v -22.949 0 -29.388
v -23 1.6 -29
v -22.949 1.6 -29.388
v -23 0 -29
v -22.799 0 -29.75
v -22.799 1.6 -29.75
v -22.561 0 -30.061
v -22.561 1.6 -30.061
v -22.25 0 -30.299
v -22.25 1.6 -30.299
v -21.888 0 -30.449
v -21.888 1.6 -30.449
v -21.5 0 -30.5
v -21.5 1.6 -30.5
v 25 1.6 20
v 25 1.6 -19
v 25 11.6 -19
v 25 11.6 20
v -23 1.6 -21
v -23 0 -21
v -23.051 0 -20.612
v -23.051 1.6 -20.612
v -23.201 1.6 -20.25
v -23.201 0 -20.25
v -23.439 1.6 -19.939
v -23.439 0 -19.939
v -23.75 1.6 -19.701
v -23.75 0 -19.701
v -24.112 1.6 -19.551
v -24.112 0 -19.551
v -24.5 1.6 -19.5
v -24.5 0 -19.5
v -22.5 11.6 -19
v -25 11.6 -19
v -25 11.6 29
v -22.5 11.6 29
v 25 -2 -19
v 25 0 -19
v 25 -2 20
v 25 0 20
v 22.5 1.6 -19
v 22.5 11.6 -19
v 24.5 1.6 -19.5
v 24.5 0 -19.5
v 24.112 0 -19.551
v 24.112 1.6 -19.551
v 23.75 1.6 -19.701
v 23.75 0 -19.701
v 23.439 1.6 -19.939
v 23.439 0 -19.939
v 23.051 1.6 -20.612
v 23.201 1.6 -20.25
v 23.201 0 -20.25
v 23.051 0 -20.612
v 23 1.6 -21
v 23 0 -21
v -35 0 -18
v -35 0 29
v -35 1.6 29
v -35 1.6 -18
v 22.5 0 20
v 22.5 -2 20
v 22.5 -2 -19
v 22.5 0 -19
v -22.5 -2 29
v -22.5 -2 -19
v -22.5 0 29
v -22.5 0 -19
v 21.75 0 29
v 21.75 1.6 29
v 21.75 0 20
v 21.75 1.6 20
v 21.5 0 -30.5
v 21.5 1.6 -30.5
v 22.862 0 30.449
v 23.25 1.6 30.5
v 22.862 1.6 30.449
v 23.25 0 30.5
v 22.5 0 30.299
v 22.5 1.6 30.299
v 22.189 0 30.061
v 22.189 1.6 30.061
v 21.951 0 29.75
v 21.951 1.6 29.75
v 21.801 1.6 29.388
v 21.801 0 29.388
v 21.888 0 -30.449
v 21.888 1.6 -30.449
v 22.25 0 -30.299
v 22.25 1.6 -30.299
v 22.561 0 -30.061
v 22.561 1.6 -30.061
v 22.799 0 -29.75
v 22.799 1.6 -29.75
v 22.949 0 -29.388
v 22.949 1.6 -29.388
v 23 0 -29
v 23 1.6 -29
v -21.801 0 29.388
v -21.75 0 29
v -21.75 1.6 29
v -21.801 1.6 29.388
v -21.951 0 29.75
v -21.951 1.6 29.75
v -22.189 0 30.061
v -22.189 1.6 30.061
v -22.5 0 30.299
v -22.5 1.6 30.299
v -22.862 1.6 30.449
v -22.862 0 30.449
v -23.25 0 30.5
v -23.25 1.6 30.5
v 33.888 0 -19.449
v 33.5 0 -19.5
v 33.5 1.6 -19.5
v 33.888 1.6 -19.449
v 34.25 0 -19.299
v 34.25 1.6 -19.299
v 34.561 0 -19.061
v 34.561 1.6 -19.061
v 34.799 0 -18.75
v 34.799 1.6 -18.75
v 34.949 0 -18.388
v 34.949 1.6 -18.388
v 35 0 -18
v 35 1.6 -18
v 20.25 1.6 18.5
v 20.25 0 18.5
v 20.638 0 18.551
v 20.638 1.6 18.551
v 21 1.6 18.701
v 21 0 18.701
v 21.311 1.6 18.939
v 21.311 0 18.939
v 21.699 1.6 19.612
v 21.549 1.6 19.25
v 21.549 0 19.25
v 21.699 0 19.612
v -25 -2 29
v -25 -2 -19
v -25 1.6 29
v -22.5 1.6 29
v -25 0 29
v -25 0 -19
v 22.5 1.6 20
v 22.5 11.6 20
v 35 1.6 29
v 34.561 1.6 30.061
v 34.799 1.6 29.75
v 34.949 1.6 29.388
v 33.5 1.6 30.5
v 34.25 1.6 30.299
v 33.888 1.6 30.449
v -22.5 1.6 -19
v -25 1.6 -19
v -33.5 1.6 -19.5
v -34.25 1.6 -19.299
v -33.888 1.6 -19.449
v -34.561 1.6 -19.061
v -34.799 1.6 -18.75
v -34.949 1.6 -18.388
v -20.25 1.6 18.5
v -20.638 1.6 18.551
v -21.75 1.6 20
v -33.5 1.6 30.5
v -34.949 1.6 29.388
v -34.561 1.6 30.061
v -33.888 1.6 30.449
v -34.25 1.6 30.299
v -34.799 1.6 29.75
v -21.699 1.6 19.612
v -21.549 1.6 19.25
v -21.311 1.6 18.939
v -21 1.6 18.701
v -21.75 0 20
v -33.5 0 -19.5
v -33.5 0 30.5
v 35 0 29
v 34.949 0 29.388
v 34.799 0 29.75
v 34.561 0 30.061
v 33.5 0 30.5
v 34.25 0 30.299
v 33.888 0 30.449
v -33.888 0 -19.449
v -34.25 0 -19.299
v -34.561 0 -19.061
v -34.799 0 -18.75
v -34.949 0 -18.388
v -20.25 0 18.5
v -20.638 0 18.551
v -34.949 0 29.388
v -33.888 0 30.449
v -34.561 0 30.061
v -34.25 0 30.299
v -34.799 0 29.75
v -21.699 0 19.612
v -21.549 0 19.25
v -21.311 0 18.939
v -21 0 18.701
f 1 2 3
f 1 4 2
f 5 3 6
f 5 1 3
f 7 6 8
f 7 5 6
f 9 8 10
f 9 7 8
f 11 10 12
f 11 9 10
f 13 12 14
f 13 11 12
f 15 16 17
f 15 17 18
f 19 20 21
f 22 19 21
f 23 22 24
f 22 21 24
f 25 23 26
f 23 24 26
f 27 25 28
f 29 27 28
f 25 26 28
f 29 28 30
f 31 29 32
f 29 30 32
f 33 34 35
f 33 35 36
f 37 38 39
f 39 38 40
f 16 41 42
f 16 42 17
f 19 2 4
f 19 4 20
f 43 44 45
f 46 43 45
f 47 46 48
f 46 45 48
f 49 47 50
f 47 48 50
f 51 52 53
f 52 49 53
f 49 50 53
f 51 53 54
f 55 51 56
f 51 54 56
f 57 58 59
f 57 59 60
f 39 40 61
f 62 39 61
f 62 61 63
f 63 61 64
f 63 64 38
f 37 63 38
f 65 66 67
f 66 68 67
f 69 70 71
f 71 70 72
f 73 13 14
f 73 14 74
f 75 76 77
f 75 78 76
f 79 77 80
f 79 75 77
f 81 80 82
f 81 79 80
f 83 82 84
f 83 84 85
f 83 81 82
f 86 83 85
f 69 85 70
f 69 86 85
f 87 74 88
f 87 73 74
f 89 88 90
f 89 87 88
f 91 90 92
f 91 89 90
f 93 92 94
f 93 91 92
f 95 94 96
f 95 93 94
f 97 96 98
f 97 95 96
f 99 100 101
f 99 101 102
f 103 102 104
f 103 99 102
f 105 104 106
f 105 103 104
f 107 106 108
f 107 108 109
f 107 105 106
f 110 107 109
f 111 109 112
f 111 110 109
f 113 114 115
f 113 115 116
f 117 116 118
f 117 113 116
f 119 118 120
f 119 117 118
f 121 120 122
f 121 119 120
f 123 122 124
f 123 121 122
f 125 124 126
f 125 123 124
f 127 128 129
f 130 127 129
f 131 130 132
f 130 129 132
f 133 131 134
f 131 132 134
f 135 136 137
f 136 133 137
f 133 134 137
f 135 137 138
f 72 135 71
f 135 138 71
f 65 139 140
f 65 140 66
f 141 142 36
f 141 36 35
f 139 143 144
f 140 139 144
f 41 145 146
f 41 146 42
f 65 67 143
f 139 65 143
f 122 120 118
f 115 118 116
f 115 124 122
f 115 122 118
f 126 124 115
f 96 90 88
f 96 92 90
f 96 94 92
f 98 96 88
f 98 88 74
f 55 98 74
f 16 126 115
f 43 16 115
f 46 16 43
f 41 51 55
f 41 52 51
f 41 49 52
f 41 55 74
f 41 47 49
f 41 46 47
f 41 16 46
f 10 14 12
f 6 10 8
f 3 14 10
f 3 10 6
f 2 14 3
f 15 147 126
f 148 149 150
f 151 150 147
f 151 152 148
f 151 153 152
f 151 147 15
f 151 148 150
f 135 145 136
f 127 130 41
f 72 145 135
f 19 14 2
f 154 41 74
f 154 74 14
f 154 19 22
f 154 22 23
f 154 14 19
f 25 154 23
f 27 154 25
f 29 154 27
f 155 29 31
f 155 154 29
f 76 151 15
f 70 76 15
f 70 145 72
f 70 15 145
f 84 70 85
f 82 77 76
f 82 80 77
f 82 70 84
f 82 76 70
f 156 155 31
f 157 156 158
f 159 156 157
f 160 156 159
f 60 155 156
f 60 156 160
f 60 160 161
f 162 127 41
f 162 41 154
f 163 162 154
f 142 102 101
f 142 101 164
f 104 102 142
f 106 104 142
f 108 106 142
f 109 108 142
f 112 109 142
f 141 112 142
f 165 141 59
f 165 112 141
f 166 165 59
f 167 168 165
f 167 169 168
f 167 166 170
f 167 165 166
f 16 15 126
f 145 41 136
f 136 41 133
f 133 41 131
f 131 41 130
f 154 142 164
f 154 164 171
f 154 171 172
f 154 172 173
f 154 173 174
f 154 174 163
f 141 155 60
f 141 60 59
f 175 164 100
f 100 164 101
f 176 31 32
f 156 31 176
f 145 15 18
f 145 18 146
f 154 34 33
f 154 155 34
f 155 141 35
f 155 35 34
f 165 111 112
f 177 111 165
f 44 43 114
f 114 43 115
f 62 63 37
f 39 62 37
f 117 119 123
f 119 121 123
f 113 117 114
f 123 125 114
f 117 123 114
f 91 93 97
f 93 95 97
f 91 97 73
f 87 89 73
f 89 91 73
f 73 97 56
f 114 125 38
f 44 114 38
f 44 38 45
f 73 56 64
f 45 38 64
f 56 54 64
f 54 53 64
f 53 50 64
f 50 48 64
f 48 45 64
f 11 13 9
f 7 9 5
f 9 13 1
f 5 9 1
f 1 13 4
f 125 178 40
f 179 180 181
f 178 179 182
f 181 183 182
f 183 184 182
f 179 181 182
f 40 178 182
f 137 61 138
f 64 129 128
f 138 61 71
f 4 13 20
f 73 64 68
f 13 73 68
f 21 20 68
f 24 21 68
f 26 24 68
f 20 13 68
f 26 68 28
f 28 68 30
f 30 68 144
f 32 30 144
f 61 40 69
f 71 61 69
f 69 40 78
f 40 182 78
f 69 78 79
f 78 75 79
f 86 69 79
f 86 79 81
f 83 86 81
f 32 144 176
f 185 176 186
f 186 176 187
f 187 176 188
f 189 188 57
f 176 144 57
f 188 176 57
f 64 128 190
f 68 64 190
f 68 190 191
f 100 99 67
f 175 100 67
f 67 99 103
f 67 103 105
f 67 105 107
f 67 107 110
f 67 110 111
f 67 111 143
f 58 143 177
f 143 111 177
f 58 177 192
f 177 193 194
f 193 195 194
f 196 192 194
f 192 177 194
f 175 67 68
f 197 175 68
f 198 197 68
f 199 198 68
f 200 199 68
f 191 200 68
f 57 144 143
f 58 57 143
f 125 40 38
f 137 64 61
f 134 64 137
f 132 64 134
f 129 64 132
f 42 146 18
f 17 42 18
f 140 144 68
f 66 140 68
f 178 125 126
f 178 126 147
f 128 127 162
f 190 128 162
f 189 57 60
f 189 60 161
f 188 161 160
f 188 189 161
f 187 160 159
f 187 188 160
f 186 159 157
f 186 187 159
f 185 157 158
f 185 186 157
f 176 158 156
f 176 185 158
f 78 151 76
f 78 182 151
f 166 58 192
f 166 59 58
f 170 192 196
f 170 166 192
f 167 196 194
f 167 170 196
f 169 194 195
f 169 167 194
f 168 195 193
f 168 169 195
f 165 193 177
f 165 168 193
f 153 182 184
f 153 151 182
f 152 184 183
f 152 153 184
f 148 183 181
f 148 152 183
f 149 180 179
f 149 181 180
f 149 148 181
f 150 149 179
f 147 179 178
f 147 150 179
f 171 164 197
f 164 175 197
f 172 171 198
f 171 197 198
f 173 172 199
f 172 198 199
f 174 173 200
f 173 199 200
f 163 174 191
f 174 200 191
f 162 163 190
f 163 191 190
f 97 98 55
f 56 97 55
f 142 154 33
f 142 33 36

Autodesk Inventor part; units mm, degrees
ref_plane "YZ Plane" through (0, 0, 0) normal (1, 0, 0) x (0, 1, 0)
ref_plane "XZ Plane" through (0, 0, 0) normal (0, 1, 0) x (-1, 0, 0)
ref_plane "XY Plane" through (0, 0, 0) normal (0, 0, 1) x (1, 0, 0)
sketch "Esquisse1" plane through (0, 0, 0) normal (0, 1, 0) x (-1, 0, 0)
  line L0 (35, -30.5) -> (-35, -30.5)
  line L1 (-35, -30.5) -> (-35, 30.5)
  line L2 (-35, 30.5) -> (35, 30.5)
  line L3 (35, 30.5) -> (35, -30.5)
  point P0 (0, 0)
  dimension "d0" = 70
  dimension "d1" = 35
  dimension "d2" = 61
  dimension "d3" = 30.5
extrude "Extrusion1" add sketch "Esquisse1" along normal blind 1.6
sketch "Esquisse2" plane through (0, 1.6, 0) normal (0, 1, 0) x (1, 0, 0)
  line L0 (35, 30.5) -> (-35, 30.5) projected
  line L1 (-35, 30.5) -> (-23, 30.5)
  line L2 (-23, 30.5) -> (-23, 19.5)
  line L3 (-23, 19.5) -> (-35, 19.5)
  line L4 (-35, 19.5) -> (-35, 30.5)
  line L5 (35, 30.5) -> (23, 30.5)
  line L6 (23, 30.5) -> (23, 19.5)
  line L7 (23, 19.5) -> (35, 19.5)
  line L8 (35, 19.5) -> (35, 30.5)
  line L9 (-35, -30.5) -> (35, -30.5) projected
  line L10 (-20.5, -30.5) -> (23, -30.5)
  line L11 (-21.75, -30.5) -> (21.75, -30.5)
  line L12 (21.75, -30.5) -> (21.75, -18.5)
  line L13 (21.75, -18.5) -> (-21.75, -18.5)
  line L14 (-21.75, -18.5) -> (-21.75, -30.5)
  point P0 (0, 0)
  dimension "d6" = 12
  dimension "d7" = 12
  dimension "d8" = 11
  dimension "d11" = 43.5
  dimension "d12" = 21.75
  dimension "d13" = 12
extrude "Extrusion2" cut sketch "Esquisse2" against normal through all
fillet "Congé1" radius 1.5 12 edges at (-35, 0.8, 30.5) (-21.75, 0.8, 30.5) (-21.75, 0.8, 18.5) (21.75, 0.8, 18.5) (21.75, 0.8, 30.5) (35, 0.8, 30.5) (23, 0.8, -19.5) (23, 0.8, -30.5) (35, 0.8, -19.5) (-23, 0.8, -30.5) (-23, 0.8, -19.5) (-35, 0.8, -19.5)
sketch "Esquisse3" plane through (0, 1.6, 0) normal (0, 1, 0) x (1, 0, 0)
  line L0 (-25, 19) -> (-22.5, 19)
  line L1 (-22.5, 19) -> (-22.5, -29)
  line L2 (-22.5, -29) -> (-25, -29)
  line L3 (-25, -29) -> (-25, 19)
  line L4 (22.5, 19) -> (25, 19)
  line L5 (25, 19) -> (25, -20)
  line L6 (25, -20) -> (22.5, -20)
  line L7 (22.5, -20) -> (22.5, 19)
  line L8 (-35, 18) -> (-35, -29) projected
  line L9 (35, -29) -> (35, 18) projected
  line L10 (-24.5, 19.5) -> (-33.5, 19.5) projected
  line L11 (33.5, 19.5) -> (24.5, 19.5) projected
  point P0 (0, 0)
  dimension "d17" = 2.5
  dimension "d18" = 2.5
  dimension "d19" = 48
  dimension "d20" = 39
  dimension "d21" = 10
  dimension "d22" = 10
  dimension "d23" = 0.5
  dimension "d24" = 0.5
extrude "Extrusion3" add sketch "Esquisse3" along normal blind 10
sketch "Esquisse4" plane through (0, 0, 0) normal (0, -1, 0) x (1, 0, 0)
  line L0 (22.5, -19) -> (25, -19) projected
  line L1 (22.5, 20) -> (22.5, -19) projected
  line L2 (25, -19) -> (25, 20) projected
  line L3 (25, 20) -> (22.5, 20) projected
  line L4 (-25, 29) -> (-25, -19) projected
  line L5 (-25, -19) -> (-22.5, -19) projected
  line L6 (-22.5, -19) -> (-22.5, 29) projected
  line L7 (-22.5, 29) -> (-25, 29) projected
  point P0 (0, 0)
extrude "Extrusion4" add sketch "Esquisse4" along normal blind 2
equation "\"d1\" = 0.5 * d0"
equation "\"d3\" = 0.5 * d2"
equation "\"d7\" = d6"
equation "\"d12\" = 0.5 * d11"
equation "\"d18\" = d17"
equation "\"d22\" = d21"
equation "\"d24\" = d23"
properties part number "X-Nucleo-IKS01A1" material "Nylon, disulfure de molybdène"
